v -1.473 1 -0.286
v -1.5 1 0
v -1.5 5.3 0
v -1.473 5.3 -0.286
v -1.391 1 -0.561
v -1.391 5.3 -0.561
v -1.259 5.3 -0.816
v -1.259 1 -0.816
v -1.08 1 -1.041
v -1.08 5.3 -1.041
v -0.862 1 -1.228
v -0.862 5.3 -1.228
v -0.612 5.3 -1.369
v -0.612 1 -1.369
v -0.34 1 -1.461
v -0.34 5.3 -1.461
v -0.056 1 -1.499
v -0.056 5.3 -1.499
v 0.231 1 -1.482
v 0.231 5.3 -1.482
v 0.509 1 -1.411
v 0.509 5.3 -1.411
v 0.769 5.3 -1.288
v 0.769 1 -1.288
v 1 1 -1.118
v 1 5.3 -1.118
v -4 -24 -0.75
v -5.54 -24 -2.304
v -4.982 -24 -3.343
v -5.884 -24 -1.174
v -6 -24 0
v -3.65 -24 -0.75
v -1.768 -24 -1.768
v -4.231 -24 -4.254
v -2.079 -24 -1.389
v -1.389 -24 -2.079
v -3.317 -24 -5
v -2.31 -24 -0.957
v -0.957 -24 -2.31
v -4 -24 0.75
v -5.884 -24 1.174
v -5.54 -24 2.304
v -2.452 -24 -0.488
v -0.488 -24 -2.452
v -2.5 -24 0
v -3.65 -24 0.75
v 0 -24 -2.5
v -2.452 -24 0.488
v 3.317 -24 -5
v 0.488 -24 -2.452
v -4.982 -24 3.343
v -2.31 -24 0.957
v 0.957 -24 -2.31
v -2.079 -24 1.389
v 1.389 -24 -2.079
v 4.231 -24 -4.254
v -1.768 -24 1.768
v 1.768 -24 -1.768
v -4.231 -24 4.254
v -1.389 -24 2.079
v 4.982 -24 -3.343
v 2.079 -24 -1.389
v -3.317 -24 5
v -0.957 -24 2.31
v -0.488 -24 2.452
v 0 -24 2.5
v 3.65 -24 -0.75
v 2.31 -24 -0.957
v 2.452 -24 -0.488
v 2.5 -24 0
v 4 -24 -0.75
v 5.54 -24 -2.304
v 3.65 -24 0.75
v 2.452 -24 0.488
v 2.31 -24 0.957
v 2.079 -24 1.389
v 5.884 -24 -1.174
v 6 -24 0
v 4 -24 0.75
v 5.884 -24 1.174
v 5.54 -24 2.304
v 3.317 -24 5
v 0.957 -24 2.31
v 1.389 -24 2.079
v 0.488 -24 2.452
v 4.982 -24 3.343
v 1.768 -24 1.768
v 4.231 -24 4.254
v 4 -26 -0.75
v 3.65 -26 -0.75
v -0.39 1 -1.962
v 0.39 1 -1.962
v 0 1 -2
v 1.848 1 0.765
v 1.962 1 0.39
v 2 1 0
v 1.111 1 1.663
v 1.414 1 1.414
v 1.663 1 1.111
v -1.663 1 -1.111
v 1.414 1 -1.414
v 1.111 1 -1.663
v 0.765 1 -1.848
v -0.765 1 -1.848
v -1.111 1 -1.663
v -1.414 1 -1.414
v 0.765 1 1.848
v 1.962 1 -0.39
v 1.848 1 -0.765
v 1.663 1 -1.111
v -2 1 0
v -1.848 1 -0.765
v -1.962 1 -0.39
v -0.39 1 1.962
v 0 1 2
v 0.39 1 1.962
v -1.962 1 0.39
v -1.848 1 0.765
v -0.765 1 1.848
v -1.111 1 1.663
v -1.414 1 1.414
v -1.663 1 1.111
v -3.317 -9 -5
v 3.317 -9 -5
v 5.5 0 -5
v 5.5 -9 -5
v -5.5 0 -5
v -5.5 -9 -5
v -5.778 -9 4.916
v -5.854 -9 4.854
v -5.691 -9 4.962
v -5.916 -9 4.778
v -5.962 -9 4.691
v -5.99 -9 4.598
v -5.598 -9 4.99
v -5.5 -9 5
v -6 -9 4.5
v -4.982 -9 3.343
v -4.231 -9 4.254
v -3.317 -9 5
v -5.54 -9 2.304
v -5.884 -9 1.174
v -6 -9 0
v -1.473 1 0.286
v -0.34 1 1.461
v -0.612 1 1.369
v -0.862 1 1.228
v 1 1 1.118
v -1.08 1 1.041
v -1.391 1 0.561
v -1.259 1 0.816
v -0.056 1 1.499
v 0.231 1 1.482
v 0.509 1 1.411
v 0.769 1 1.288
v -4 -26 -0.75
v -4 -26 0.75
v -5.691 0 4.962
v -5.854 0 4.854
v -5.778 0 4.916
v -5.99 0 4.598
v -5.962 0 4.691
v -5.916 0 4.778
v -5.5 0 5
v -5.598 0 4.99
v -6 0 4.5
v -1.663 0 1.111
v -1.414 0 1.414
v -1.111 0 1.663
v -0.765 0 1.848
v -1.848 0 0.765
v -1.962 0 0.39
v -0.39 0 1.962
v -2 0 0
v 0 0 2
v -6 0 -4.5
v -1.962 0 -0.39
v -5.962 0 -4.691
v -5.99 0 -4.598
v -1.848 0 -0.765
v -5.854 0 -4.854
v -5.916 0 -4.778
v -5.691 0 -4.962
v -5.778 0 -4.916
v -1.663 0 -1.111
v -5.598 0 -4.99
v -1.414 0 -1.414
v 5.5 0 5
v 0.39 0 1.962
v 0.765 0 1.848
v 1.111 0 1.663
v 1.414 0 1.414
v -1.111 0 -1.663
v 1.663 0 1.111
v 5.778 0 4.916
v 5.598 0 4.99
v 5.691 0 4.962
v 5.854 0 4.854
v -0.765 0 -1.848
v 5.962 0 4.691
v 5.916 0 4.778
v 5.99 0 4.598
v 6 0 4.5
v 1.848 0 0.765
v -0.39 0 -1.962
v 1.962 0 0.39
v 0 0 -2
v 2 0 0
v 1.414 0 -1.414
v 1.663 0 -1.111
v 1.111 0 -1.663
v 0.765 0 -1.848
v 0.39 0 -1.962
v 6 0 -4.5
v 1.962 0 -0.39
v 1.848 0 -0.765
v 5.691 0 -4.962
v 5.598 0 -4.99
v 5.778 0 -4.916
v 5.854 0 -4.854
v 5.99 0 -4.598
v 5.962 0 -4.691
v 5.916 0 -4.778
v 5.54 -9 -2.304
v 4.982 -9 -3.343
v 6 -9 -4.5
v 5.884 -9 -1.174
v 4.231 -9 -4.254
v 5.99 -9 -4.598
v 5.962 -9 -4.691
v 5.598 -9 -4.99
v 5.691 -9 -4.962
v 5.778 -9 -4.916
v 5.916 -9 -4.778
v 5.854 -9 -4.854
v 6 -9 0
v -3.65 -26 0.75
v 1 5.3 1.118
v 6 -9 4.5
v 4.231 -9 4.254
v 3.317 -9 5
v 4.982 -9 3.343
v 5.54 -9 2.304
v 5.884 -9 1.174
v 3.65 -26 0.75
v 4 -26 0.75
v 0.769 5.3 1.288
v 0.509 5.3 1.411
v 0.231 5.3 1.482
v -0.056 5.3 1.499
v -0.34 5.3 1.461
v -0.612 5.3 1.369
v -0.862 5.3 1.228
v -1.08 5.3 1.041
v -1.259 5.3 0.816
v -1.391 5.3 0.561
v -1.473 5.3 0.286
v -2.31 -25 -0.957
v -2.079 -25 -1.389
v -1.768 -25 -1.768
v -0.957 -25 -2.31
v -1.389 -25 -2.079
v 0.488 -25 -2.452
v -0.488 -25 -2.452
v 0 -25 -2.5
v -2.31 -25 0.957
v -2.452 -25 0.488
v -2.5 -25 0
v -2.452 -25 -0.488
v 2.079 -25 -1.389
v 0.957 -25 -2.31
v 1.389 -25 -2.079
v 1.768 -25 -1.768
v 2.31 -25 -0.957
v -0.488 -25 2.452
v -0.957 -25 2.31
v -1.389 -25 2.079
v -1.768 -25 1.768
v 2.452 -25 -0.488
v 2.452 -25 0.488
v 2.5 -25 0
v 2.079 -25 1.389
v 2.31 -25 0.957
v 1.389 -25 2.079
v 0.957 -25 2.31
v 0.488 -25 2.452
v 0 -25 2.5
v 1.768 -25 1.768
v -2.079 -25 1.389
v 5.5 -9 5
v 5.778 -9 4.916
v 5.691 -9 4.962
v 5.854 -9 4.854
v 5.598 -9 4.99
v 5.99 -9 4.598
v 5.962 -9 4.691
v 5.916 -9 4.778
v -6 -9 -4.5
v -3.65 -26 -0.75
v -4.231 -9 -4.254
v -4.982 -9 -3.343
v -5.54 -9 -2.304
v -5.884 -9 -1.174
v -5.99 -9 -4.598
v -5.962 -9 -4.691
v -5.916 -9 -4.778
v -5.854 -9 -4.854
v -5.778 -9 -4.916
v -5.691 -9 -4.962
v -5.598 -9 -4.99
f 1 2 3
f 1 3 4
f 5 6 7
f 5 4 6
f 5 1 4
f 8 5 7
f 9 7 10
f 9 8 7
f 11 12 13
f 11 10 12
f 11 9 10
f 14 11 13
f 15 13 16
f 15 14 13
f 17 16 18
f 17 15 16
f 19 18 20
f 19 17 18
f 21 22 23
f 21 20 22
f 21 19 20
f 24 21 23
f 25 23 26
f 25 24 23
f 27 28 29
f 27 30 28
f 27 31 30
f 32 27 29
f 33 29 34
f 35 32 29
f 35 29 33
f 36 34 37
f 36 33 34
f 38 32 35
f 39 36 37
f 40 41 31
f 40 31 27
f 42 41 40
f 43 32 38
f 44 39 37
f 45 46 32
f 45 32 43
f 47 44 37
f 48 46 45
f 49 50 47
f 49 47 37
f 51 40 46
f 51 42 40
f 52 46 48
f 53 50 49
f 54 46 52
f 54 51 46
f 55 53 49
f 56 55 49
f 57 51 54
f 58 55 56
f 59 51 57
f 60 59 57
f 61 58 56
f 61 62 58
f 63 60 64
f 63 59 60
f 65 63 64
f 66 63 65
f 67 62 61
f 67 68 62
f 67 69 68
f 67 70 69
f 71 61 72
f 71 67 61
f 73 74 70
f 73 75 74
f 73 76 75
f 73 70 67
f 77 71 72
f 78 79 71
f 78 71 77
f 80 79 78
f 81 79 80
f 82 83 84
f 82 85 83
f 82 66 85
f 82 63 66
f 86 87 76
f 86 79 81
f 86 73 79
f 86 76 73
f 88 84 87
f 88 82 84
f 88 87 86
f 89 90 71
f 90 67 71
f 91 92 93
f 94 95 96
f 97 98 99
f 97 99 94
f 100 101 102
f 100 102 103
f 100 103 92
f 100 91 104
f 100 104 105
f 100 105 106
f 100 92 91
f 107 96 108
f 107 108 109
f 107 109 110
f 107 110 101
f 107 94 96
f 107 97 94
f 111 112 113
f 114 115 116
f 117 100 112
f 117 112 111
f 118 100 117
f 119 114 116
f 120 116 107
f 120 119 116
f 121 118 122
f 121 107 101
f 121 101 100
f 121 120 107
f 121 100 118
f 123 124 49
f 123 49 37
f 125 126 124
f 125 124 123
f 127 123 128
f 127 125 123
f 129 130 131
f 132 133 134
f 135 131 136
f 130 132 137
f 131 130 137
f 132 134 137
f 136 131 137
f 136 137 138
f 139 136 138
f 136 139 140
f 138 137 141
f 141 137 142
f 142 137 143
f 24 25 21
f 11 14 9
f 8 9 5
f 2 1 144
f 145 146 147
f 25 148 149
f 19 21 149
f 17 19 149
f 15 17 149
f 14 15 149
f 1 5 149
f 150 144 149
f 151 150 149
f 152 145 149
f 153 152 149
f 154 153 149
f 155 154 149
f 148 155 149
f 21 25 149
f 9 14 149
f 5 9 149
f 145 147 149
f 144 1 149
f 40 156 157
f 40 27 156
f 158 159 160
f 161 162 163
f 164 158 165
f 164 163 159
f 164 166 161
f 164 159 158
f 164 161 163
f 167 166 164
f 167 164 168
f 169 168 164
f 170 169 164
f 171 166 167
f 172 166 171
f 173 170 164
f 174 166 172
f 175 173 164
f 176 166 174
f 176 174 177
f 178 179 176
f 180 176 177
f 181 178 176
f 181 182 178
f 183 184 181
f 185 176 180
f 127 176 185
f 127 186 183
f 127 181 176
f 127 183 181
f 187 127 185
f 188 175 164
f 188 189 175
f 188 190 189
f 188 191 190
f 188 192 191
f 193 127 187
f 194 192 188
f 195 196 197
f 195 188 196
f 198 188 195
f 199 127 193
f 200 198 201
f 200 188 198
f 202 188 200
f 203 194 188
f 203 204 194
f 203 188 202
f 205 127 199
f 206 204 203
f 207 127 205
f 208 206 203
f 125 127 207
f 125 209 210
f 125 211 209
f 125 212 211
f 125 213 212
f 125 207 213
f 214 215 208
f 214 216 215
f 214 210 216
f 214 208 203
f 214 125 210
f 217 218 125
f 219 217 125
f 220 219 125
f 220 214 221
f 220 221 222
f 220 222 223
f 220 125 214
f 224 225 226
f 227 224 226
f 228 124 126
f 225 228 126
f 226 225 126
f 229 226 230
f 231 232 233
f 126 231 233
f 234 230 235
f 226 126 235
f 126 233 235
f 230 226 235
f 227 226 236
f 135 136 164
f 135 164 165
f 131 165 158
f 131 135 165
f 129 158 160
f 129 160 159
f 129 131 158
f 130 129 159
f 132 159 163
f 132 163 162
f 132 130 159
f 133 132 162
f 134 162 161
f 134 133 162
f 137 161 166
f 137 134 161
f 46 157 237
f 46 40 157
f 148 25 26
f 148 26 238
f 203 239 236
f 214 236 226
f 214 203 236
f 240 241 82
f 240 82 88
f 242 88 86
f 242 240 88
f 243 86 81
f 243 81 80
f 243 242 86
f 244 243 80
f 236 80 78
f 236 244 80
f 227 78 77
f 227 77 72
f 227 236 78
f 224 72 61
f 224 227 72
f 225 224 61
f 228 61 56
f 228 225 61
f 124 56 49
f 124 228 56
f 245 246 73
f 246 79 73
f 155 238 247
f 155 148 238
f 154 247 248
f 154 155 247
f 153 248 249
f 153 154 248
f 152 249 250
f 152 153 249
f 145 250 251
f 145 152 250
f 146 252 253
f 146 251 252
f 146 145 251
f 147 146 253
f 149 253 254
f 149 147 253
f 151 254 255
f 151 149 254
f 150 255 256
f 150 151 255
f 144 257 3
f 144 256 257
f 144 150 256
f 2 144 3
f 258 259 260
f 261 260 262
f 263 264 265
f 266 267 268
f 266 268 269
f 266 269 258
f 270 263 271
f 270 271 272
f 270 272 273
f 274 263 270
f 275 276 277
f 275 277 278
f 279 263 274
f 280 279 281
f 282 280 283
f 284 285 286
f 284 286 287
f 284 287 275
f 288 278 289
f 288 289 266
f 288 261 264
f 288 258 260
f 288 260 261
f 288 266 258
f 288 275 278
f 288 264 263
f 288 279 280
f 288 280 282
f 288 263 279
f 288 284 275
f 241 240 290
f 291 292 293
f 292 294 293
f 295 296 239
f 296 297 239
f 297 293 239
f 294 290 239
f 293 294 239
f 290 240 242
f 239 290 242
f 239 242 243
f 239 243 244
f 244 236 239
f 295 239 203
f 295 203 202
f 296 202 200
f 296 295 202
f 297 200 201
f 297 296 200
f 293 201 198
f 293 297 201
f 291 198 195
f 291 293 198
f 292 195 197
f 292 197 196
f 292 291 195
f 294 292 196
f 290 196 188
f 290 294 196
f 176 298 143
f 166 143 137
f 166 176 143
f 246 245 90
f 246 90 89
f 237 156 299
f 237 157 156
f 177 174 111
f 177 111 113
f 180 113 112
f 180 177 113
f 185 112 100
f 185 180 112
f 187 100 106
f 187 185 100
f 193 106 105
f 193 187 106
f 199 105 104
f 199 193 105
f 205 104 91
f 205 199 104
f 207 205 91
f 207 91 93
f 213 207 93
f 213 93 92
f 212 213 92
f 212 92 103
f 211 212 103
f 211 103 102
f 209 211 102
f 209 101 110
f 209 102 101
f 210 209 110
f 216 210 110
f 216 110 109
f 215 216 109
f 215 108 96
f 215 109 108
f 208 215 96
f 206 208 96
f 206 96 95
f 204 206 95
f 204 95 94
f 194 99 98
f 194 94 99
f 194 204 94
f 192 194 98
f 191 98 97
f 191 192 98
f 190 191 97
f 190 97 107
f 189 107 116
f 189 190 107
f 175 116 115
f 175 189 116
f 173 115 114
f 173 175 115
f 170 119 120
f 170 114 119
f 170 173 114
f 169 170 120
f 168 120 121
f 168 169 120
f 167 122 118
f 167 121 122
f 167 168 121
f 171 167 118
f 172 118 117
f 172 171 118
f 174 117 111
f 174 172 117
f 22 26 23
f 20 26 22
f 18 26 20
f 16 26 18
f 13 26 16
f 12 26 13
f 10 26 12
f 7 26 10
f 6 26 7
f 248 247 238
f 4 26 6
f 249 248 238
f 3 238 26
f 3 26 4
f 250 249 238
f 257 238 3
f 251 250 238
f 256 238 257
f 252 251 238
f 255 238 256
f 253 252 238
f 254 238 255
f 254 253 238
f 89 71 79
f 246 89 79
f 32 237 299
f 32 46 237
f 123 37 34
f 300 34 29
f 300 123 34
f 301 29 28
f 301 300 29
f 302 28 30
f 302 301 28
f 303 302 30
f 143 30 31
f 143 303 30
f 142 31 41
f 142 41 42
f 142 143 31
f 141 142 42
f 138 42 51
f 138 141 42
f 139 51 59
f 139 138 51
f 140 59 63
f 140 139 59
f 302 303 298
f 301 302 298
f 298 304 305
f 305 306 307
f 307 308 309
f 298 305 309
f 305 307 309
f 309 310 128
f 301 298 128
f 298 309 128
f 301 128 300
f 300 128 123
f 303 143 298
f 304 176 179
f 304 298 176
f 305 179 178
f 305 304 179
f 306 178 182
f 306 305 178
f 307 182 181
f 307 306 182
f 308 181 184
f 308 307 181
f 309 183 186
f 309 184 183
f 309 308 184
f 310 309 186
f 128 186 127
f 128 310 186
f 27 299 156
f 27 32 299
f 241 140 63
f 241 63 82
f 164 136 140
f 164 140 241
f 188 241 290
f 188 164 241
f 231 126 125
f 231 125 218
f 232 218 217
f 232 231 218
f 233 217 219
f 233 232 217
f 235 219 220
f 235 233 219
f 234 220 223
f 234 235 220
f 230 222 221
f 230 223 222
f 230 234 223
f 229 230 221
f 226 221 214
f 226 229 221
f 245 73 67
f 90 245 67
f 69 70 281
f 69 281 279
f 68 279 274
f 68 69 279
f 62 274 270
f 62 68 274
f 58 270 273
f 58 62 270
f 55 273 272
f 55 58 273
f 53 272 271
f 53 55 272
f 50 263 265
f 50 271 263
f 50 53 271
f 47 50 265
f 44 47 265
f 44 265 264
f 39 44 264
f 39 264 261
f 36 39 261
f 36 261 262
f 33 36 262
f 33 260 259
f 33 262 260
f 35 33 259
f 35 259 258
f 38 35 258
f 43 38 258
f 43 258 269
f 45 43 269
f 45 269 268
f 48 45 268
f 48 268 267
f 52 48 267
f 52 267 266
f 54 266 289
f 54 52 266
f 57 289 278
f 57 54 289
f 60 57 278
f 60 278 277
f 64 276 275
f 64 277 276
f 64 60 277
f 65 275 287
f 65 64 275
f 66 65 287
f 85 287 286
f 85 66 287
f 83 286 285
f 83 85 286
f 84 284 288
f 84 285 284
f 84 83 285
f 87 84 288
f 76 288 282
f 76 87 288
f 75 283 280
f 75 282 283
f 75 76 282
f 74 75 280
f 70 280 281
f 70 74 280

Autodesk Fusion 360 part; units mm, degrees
sketch "Sketch1" plane through (0, 0, 0) normal (0, 1, 0) x (1, 0, 0) in component "Motor"
  line L0 (6, 5) -> (-6, 5)
  line L1 (-6, 5) -> (-6, -5)
  line L2 (-6, -5) -> (6, -5)
  line L3 (6, -5) -> (6, 5)
  line L4 (6, 5) -> (-6, -5) construction
  line L5 (-6, 5) -> (6, -5) construction
  dimension "d1" = 10
  dimension "d2" = 12
extrude "Extrude1" add sketch "Sketch1" against normal blind 9 makes body 1 in component "Motor"
sketch "Sketch2" plane through (0, -9, 0) normal (0, -1, 0) x (1, 0, 0) in component "Motor"
  line L0 (6, -5) -> (6, 5)
  line L1 (6, 5) -> (-6, 5)
  line L2 (-6, 5) -> (-6, -5)
  line L3 (-6, -5) -> (6, -5)
  circle A0 centre (0, 0) radius 6
extrude "Extrude2" add sketch "Sketch2" along normal blind 15 contours L1 L3 A0 bodies 1 in component "Motor"
sketch "Sketch3" plane through (0, -24, 0) normal (0, -1, 0) x (1, 0, 0) in component "Motor"
  arc A0 (3.3166, -5) -> (3.3166, 5) centre (0, 0) ccw
  line L0 (3.3166, 5) -> (-3.3166, 5)
  arc A1 (-3.3166, 5) -> (-3.3166, -5) centre (0, 0) ccw
  line L1 (-3.3166, -5) -> (3.3166, -5)
  circle A2 centre (0, 0) radius 2.5
  line L2 (-4, 0) -> (4, 0) construction
  line L3 (0, 5) -> (0, -5) construction
  line L4 (-4, 0.75) -> (-3.65, 0.75)
  line L5 (-3.65, 0.75) -> (-3.65, -0.75)
  line L6 (-3.65, -0.75) -> (-4, -0.75)
  line L7 (-4, -0.75) -> (-4, 0.75)
  line L8 (3.65, -0.75) -> (4, -0.75)
  line L9 (4, -0.75) -> (4, 0.75)
  line L10 (3.65, 0.75) -> (3.65, -0.75)
  line L11 (4, 0.75) -> (3.65, 0.75)
  dimension "d7" = 5
  dimension "d10" = 8
  dimension "d11" = 0.35
  dimension "d12" = 1.5
extrude "Extrude4" add sketch "Sketch3" along normal blind 2 contours L4 L5 L6 L7 | L8 L9 L10 L11 bodies 1 in component "Motor"
extrude "Extrude3" add sketch "Sketch3" along normal blind 1 contours A2 bodies 1 in component "Motor"
fillet "Fillet1" radius 0.5 4 edges at (6, -4.5, -5) (-6, -4.5, -5) (-6, -4.5, 5) (6, -4.5, 5) on bodies 1 in component "Motor"
sketch "Sketch4" plane through (0, 0, 0) normal (0, 1, 0) x (-1, 0, 0) in component "Motor"
  arc A0 (-5.5, 5) -> (-6, 4.5) centre (-5.5, 4.5) ccw
  line L0 (-6, 4.5) -> (-6, -4.5)
  arc A1 (-6, -4.5) -> (-5.5, -5) centre (-5.5, -4.5) ccw
  line L1 (-5.5, -5) -> (5.5, -5)
  arc A2 (5.5, -5) -> (6, -4.5) centre (5.5, -4.5) ccw
  line L2 (6, -4.5) -> (6, 4.5)
  arc A3 (6, 4.5) -> (5.5, 5) centre (5.5, 4.5) ccw
  line L3 (5.5, 5) -> (-5.5, 5)
  circle A4 centre (0, 0) radius 2
  dimension "d16" = 4
extrude "Extrude5" add sketch "Sketch4" along normal blind 1 contours A4 bodies 1 in component "Motor"
sketch "Sketch5" plane through (0, 1, 0) normal (0, 1, 0) x (-1, 0, 0) in component "Motor"
  circle A0 centre (0, 0) radius 2
  circle A1 centre (0, 0) radius 1.5
  line L0 (-1, -1.118) -> (-1, 1.118)
  line L1 (3.3166, -5) -> (-3.3166, -5) construction
  line L2 (5.5, 5) -> (-5.5, 5) construction
  line L3 (1.5, -5) -> (1.5, 5) construction
  dimension "d19" = 3
  dimension "d20" = 2.5
extrude "Extrude6" add sketch "Sketch5" along normal blind 4.3 separate body contours A1 L0 picked at (-0.4625, 0.4564) makes body 2 in component "Motor"
copy_body "CutPasteBodies1" bodies 2 removing the originals makes body 3 in component "Rotor"
component "Motor" placed x (1, 0, 0) y (0, 1, 0) z (0, 0, 1) at (0, 0, 0)
component "Rotor" placed x (1, 0, 0) y (0, 1, 0) z (0, 0, 1) at (0, 0, 0)
